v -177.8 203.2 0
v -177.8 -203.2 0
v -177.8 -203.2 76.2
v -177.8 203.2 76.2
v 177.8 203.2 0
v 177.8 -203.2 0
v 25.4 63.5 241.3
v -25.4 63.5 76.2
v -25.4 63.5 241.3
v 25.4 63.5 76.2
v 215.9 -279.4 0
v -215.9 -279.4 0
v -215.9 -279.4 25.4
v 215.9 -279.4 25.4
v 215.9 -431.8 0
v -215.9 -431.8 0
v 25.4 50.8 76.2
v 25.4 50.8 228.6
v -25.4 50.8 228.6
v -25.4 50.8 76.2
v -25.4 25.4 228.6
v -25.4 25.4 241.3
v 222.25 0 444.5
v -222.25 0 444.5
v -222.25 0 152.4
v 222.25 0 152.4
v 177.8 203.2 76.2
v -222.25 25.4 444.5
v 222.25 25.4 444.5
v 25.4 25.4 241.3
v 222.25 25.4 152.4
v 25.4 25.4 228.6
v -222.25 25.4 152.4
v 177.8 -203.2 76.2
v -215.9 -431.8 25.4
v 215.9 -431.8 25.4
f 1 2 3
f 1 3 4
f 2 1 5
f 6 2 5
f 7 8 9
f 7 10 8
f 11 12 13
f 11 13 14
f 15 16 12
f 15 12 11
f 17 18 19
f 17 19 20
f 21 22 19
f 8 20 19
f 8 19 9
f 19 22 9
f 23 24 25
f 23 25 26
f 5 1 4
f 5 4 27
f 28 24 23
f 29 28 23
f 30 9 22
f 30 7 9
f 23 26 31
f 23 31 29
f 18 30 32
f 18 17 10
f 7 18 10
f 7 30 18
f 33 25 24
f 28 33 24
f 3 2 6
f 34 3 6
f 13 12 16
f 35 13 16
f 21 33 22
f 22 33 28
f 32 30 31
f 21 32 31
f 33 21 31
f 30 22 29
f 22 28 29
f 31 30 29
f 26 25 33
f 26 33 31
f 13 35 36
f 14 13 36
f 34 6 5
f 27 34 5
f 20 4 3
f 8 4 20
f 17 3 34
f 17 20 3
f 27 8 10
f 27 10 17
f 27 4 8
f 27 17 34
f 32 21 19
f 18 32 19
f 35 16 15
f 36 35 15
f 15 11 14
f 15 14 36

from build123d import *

# Parameters (mm, degrees)
F0_W     = 355.6
F0_H     = 406.4
F1_DEPTH = 76.2
F3_DEPTH = 25.4
F4_W     = 444.5
F4_H     = 292.1
F5_DEPTH = 25.4
F7_W     = 431.8
F7_H     = 152.4
F8_DEPTH = 25.4


with BuildPart() as f1:
    # F0 (on Top) → F1 (new body)
    with BuildSketch(Plane.XY):
        Rectangle(F0_W, F0_H)
    extrude(amount=F1_DEPTH)

    # F2 (on Right) → F3 (join, symmetric)
    with BuildSketch(Plane.YZ):
        Polygon((63.5, 241.3), (25.4, 241.3), (25.4, 228.6), (50.8, 228.6), (50.8, 76.2), (63.5, 76.2), align=None)
    extrude(amount=F3_DEPTH, both=True)

    # F4 (on Front) → F5 (join)
    with BuildSketch(Plane.XZ):
        with Locations((0, 298.45)):
            Rectangle(F4_W, F4_H)
    extrude(amount=-F5_DEPTH)


with BuildPart() as f8:
    # F7 (on offset) → F8 (new body)
    with BuildSketch(Plane(origin=(0, 0, 0), x_dir=(1, 0, 0), z_dir=(0, 0, -1))):
        with Locations((0, 355.6)):
            Rectangle(F7_W, F7_H)
    extrude(amount=-F8_DEPTH)


solid = Compound([f1.part, f8.part])
